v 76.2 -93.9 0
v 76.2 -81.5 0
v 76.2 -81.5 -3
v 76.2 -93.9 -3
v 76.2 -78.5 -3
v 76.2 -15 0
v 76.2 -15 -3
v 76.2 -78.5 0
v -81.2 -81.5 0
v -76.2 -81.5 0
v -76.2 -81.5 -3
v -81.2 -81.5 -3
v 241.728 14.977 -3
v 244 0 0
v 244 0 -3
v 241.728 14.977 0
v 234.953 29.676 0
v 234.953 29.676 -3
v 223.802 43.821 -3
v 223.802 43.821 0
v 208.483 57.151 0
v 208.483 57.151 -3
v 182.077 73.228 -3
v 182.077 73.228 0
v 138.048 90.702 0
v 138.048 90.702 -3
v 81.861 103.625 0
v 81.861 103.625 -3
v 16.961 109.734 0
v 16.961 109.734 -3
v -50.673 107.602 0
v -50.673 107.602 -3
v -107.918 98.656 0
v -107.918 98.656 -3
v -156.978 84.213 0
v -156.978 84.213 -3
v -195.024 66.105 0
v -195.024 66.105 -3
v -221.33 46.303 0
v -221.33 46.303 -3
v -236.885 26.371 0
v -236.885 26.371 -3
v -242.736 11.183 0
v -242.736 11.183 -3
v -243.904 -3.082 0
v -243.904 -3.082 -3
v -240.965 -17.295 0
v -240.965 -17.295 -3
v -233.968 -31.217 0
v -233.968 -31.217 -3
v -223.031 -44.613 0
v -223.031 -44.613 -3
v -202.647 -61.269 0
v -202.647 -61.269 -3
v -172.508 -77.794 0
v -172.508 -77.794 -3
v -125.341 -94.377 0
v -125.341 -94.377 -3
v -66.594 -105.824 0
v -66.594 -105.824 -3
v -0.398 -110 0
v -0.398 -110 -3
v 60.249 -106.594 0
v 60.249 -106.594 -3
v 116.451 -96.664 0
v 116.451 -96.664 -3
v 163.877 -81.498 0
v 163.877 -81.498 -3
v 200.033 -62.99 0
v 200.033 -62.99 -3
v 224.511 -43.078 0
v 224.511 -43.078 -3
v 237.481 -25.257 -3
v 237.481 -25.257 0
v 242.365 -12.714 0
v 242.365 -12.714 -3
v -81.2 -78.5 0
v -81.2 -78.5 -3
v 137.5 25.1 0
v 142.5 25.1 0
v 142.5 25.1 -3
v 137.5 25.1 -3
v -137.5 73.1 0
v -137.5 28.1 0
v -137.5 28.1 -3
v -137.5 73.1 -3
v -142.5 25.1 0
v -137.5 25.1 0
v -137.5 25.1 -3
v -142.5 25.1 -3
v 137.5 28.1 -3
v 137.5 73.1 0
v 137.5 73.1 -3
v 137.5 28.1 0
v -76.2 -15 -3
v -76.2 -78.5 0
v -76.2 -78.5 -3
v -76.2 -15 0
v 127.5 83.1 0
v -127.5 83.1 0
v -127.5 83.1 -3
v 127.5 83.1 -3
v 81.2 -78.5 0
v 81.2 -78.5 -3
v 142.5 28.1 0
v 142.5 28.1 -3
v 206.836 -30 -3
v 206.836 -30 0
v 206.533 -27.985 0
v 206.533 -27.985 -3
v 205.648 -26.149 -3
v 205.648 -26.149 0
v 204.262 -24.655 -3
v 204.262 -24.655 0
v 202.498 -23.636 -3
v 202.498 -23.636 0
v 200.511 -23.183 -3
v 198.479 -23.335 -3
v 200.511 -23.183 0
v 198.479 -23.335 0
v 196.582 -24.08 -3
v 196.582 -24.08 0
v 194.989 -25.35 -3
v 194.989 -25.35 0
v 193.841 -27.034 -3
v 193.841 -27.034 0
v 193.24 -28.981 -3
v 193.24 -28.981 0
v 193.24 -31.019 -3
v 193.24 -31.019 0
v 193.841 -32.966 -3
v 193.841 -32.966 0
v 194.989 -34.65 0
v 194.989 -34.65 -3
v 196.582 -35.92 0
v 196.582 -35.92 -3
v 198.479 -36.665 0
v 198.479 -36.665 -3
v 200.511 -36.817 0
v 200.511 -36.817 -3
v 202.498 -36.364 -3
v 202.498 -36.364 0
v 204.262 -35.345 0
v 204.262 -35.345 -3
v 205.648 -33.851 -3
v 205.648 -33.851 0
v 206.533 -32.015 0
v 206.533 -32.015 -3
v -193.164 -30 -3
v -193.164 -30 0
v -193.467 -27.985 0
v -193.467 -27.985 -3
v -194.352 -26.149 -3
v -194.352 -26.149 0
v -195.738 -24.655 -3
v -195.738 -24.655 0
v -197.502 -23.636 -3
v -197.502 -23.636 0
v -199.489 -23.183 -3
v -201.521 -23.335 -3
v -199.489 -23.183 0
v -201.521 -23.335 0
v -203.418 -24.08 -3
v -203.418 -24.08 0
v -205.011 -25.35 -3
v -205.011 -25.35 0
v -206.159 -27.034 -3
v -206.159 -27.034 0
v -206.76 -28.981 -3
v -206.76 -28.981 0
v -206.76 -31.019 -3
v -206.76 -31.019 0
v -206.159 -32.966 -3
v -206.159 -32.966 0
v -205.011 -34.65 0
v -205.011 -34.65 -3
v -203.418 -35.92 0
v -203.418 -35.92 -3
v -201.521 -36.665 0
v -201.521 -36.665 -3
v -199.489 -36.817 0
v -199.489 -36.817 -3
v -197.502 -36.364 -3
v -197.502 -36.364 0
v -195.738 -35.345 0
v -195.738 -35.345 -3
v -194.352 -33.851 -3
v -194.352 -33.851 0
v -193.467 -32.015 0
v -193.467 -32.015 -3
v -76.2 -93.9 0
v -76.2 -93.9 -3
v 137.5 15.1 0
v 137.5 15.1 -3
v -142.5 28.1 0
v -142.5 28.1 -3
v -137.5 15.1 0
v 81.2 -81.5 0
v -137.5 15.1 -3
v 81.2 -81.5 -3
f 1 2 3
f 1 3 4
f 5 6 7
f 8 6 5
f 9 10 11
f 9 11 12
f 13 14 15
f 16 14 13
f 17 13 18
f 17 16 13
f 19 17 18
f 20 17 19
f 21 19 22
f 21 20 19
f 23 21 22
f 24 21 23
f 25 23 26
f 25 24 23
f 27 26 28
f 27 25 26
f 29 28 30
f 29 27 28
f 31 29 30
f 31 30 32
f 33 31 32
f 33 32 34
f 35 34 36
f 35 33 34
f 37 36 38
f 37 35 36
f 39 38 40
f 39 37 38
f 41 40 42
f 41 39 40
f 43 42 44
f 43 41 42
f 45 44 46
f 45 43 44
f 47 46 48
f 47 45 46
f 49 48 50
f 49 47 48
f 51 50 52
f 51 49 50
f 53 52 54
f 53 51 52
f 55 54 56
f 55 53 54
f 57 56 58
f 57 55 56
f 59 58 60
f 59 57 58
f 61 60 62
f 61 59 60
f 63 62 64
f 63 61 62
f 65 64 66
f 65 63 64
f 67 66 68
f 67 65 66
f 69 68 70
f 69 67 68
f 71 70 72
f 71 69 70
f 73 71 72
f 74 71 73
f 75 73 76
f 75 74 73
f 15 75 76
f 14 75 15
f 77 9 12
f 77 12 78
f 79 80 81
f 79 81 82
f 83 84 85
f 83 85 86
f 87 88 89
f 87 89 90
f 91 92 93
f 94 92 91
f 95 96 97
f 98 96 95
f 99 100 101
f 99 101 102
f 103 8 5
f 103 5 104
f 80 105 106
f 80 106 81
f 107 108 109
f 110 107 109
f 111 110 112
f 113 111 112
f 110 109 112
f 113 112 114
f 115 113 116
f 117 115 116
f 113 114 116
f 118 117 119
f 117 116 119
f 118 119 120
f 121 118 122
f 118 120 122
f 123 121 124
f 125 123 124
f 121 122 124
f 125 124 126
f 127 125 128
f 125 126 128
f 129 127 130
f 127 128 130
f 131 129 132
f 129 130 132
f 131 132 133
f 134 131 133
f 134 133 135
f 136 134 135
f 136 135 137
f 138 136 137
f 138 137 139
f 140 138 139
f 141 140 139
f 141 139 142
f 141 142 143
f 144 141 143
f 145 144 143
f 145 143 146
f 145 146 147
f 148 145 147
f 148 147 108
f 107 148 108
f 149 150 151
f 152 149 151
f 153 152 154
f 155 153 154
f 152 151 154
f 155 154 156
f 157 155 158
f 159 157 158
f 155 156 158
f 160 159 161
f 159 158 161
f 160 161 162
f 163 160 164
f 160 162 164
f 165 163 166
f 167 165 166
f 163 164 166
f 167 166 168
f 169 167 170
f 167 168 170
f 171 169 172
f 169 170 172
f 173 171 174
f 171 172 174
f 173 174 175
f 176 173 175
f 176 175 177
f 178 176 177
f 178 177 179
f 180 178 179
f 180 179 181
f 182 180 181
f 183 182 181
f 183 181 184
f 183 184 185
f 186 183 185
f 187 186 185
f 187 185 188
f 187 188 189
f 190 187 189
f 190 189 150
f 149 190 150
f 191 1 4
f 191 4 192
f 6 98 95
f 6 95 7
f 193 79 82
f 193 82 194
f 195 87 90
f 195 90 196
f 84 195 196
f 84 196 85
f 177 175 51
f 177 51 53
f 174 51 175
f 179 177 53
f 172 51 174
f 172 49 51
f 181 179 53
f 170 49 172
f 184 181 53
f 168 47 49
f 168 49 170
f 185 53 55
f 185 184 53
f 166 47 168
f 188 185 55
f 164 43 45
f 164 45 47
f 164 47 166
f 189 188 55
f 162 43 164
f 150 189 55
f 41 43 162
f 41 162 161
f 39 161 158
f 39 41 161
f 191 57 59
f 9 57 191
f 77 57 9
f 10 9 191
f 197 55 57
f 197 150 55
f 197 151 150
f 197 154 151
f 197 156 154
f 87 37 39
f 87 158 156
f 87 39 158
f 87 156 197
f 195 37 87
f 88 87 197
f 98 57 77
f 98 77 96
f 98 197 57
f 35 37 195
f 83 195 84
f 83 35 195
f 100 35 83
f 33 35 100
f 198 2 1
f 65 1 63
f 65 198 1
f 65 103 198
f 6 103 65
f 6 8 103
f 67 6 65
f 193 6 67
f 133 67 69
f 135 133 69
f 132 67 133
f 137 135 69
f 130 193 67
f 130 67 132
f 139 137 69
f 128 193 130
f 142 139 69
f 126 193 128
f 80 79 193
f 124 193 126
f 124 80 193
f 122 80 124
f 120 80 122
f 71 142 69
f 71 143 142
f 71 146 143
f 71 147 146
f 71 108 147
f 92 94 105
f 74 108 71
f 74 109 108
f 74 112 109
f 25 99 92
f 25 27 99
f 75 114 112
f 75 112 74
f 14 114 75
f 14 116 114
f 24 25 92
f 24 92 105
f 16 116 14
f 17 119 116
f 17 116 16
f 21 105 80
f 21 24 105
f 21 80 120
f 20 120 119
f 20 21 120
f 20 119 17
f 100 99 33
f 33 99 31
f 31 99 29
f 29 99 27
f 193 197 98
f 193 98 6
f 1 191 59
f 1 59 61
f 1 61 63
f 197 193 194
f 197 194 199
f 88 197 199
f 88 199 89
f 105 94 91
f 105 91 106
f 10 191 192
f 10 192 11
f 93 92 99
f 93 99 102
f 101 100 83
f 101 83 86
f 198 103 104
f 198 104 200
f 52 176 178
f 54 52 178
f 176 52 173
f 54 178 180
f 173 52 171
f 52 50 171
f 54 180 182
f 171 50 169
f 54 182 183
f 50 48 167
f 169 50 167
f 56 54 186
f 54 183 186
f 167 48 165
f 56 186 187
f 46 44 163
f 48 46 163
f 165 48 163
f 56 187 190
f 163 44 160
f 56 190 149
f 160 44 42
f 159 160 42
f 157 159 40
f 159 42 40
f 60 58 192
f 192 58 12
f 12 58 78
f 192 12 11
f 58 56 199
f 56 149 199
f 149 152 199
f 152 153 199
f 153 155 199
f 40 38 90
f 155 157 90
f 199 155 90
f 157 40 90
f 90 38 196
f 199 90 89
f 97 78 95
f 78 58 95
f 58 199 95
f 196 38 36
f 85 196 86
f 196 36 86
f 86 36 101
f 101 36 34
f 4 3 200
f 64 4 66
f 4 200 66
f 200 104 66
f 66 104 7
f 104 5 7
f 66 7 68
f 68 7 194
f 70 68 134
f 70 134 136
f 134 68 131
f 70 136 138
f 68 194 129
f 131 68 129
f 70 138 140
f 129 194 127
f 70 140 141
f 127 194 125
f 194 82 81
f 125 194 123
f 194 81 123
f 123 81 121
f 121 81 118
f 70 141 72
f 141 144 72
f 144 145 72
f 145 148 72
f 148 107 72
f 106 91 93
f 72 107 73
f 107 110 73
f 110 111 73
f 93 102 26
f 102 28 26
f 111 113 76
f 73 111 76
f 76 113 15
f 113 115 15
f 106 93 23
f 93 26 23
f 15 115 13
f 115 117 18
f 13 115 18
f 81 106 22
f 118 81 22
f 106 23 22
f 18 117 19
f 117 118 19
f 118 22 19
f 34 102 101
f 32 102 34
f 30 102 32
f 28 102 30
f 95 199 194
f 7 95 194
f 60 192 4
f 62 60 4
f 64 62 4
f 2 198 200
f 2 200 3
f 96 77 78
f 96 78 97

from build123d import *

# Parameters (mm, degrees)
SKETCH1_RX          = 244
SKETCH1_RY          = 110
BOSS_EXTRUDE1_DEPTH = 3
CUT_EXTRUDE5_DEPTH  = 4
CUT_EXTRUDE7_DEPTH  = 4
SKETCH12_R          = 6.83635542
CUT_EXTRUDE8_DEPTH  = 4
CHAMFER1_SIZE       = 10


with BuildPart() as part:
    # Sketch1 → Boss-Extrude1 (new body)
    with BuildSketch(Plane.XY):
        with Locations((0, 0)):
            Ellipse(SKETCH1_RX, SKETCH1_RY)
    extrude(amount=-BOSS_EXTRUDE1_DEPTH)

    # Sketch10 → Cut-Extrude5 (cut, through all)
    with BuildSketch(Plane.XY):
        Polygon((-137.5, 83.1), (137.5, 83.1), (137.5, 28.1), (142.5, 28.1), (142.5, 25.1), (137.5, 25.1), (137.5, 15.1), (-137.5, 15.1), (-137.5, 25.1), (-142.5, 25.1), (-142.5, 28.1), (-137.5, 28.1), align=None)
    extrude(amount=-CUT_EXTRUDE5_DEPTH, mode=Mode.SUBTRACT)

    # Sketch13 → Cut-Extrude7 (cut, through all)
    with BuildSketch(Plane.XY):
        Polygon((76.2, -81.5), (76.2, -93.9), (-76.2, -93.9), (-76.2, -81.5), (-81.2, -81.5), (-81.2, -78.5), (-76.2, -78.5), (-76.2, -15), (76.2, -15), (76.2, -78.5), (81.2, -78.5), (81.2, -81.5), align=None)
    extrude(amount=-CUT_EXTRUDE7_DEPTH, mode=Mode.SUBTRACT)

    # Sketch12 → Cut-Extrude8 (cut, through all)
    with BuildSketch(Plane.XY):
        with Locations((200, -30)):
            Circle(SKETCH12_R)
        with Locations((-200, -30)):
            Circle(SKETCH12_R)
    extrude(amount=-CUT_EXTRUDE8_DEPTH, mode=Mode.SUBTRACT)

    # Chamfer1
    chamfer1_edges = [part.edges().sort_by_distance(p)[0] for p in [
        (-137.5, 83.1, -1.5),
        (137.5, 83.1, -1.5),
    ]]
    chamfer(chamfer1_edges, length=CHAMFER1_SIZE)


solid = part.part
